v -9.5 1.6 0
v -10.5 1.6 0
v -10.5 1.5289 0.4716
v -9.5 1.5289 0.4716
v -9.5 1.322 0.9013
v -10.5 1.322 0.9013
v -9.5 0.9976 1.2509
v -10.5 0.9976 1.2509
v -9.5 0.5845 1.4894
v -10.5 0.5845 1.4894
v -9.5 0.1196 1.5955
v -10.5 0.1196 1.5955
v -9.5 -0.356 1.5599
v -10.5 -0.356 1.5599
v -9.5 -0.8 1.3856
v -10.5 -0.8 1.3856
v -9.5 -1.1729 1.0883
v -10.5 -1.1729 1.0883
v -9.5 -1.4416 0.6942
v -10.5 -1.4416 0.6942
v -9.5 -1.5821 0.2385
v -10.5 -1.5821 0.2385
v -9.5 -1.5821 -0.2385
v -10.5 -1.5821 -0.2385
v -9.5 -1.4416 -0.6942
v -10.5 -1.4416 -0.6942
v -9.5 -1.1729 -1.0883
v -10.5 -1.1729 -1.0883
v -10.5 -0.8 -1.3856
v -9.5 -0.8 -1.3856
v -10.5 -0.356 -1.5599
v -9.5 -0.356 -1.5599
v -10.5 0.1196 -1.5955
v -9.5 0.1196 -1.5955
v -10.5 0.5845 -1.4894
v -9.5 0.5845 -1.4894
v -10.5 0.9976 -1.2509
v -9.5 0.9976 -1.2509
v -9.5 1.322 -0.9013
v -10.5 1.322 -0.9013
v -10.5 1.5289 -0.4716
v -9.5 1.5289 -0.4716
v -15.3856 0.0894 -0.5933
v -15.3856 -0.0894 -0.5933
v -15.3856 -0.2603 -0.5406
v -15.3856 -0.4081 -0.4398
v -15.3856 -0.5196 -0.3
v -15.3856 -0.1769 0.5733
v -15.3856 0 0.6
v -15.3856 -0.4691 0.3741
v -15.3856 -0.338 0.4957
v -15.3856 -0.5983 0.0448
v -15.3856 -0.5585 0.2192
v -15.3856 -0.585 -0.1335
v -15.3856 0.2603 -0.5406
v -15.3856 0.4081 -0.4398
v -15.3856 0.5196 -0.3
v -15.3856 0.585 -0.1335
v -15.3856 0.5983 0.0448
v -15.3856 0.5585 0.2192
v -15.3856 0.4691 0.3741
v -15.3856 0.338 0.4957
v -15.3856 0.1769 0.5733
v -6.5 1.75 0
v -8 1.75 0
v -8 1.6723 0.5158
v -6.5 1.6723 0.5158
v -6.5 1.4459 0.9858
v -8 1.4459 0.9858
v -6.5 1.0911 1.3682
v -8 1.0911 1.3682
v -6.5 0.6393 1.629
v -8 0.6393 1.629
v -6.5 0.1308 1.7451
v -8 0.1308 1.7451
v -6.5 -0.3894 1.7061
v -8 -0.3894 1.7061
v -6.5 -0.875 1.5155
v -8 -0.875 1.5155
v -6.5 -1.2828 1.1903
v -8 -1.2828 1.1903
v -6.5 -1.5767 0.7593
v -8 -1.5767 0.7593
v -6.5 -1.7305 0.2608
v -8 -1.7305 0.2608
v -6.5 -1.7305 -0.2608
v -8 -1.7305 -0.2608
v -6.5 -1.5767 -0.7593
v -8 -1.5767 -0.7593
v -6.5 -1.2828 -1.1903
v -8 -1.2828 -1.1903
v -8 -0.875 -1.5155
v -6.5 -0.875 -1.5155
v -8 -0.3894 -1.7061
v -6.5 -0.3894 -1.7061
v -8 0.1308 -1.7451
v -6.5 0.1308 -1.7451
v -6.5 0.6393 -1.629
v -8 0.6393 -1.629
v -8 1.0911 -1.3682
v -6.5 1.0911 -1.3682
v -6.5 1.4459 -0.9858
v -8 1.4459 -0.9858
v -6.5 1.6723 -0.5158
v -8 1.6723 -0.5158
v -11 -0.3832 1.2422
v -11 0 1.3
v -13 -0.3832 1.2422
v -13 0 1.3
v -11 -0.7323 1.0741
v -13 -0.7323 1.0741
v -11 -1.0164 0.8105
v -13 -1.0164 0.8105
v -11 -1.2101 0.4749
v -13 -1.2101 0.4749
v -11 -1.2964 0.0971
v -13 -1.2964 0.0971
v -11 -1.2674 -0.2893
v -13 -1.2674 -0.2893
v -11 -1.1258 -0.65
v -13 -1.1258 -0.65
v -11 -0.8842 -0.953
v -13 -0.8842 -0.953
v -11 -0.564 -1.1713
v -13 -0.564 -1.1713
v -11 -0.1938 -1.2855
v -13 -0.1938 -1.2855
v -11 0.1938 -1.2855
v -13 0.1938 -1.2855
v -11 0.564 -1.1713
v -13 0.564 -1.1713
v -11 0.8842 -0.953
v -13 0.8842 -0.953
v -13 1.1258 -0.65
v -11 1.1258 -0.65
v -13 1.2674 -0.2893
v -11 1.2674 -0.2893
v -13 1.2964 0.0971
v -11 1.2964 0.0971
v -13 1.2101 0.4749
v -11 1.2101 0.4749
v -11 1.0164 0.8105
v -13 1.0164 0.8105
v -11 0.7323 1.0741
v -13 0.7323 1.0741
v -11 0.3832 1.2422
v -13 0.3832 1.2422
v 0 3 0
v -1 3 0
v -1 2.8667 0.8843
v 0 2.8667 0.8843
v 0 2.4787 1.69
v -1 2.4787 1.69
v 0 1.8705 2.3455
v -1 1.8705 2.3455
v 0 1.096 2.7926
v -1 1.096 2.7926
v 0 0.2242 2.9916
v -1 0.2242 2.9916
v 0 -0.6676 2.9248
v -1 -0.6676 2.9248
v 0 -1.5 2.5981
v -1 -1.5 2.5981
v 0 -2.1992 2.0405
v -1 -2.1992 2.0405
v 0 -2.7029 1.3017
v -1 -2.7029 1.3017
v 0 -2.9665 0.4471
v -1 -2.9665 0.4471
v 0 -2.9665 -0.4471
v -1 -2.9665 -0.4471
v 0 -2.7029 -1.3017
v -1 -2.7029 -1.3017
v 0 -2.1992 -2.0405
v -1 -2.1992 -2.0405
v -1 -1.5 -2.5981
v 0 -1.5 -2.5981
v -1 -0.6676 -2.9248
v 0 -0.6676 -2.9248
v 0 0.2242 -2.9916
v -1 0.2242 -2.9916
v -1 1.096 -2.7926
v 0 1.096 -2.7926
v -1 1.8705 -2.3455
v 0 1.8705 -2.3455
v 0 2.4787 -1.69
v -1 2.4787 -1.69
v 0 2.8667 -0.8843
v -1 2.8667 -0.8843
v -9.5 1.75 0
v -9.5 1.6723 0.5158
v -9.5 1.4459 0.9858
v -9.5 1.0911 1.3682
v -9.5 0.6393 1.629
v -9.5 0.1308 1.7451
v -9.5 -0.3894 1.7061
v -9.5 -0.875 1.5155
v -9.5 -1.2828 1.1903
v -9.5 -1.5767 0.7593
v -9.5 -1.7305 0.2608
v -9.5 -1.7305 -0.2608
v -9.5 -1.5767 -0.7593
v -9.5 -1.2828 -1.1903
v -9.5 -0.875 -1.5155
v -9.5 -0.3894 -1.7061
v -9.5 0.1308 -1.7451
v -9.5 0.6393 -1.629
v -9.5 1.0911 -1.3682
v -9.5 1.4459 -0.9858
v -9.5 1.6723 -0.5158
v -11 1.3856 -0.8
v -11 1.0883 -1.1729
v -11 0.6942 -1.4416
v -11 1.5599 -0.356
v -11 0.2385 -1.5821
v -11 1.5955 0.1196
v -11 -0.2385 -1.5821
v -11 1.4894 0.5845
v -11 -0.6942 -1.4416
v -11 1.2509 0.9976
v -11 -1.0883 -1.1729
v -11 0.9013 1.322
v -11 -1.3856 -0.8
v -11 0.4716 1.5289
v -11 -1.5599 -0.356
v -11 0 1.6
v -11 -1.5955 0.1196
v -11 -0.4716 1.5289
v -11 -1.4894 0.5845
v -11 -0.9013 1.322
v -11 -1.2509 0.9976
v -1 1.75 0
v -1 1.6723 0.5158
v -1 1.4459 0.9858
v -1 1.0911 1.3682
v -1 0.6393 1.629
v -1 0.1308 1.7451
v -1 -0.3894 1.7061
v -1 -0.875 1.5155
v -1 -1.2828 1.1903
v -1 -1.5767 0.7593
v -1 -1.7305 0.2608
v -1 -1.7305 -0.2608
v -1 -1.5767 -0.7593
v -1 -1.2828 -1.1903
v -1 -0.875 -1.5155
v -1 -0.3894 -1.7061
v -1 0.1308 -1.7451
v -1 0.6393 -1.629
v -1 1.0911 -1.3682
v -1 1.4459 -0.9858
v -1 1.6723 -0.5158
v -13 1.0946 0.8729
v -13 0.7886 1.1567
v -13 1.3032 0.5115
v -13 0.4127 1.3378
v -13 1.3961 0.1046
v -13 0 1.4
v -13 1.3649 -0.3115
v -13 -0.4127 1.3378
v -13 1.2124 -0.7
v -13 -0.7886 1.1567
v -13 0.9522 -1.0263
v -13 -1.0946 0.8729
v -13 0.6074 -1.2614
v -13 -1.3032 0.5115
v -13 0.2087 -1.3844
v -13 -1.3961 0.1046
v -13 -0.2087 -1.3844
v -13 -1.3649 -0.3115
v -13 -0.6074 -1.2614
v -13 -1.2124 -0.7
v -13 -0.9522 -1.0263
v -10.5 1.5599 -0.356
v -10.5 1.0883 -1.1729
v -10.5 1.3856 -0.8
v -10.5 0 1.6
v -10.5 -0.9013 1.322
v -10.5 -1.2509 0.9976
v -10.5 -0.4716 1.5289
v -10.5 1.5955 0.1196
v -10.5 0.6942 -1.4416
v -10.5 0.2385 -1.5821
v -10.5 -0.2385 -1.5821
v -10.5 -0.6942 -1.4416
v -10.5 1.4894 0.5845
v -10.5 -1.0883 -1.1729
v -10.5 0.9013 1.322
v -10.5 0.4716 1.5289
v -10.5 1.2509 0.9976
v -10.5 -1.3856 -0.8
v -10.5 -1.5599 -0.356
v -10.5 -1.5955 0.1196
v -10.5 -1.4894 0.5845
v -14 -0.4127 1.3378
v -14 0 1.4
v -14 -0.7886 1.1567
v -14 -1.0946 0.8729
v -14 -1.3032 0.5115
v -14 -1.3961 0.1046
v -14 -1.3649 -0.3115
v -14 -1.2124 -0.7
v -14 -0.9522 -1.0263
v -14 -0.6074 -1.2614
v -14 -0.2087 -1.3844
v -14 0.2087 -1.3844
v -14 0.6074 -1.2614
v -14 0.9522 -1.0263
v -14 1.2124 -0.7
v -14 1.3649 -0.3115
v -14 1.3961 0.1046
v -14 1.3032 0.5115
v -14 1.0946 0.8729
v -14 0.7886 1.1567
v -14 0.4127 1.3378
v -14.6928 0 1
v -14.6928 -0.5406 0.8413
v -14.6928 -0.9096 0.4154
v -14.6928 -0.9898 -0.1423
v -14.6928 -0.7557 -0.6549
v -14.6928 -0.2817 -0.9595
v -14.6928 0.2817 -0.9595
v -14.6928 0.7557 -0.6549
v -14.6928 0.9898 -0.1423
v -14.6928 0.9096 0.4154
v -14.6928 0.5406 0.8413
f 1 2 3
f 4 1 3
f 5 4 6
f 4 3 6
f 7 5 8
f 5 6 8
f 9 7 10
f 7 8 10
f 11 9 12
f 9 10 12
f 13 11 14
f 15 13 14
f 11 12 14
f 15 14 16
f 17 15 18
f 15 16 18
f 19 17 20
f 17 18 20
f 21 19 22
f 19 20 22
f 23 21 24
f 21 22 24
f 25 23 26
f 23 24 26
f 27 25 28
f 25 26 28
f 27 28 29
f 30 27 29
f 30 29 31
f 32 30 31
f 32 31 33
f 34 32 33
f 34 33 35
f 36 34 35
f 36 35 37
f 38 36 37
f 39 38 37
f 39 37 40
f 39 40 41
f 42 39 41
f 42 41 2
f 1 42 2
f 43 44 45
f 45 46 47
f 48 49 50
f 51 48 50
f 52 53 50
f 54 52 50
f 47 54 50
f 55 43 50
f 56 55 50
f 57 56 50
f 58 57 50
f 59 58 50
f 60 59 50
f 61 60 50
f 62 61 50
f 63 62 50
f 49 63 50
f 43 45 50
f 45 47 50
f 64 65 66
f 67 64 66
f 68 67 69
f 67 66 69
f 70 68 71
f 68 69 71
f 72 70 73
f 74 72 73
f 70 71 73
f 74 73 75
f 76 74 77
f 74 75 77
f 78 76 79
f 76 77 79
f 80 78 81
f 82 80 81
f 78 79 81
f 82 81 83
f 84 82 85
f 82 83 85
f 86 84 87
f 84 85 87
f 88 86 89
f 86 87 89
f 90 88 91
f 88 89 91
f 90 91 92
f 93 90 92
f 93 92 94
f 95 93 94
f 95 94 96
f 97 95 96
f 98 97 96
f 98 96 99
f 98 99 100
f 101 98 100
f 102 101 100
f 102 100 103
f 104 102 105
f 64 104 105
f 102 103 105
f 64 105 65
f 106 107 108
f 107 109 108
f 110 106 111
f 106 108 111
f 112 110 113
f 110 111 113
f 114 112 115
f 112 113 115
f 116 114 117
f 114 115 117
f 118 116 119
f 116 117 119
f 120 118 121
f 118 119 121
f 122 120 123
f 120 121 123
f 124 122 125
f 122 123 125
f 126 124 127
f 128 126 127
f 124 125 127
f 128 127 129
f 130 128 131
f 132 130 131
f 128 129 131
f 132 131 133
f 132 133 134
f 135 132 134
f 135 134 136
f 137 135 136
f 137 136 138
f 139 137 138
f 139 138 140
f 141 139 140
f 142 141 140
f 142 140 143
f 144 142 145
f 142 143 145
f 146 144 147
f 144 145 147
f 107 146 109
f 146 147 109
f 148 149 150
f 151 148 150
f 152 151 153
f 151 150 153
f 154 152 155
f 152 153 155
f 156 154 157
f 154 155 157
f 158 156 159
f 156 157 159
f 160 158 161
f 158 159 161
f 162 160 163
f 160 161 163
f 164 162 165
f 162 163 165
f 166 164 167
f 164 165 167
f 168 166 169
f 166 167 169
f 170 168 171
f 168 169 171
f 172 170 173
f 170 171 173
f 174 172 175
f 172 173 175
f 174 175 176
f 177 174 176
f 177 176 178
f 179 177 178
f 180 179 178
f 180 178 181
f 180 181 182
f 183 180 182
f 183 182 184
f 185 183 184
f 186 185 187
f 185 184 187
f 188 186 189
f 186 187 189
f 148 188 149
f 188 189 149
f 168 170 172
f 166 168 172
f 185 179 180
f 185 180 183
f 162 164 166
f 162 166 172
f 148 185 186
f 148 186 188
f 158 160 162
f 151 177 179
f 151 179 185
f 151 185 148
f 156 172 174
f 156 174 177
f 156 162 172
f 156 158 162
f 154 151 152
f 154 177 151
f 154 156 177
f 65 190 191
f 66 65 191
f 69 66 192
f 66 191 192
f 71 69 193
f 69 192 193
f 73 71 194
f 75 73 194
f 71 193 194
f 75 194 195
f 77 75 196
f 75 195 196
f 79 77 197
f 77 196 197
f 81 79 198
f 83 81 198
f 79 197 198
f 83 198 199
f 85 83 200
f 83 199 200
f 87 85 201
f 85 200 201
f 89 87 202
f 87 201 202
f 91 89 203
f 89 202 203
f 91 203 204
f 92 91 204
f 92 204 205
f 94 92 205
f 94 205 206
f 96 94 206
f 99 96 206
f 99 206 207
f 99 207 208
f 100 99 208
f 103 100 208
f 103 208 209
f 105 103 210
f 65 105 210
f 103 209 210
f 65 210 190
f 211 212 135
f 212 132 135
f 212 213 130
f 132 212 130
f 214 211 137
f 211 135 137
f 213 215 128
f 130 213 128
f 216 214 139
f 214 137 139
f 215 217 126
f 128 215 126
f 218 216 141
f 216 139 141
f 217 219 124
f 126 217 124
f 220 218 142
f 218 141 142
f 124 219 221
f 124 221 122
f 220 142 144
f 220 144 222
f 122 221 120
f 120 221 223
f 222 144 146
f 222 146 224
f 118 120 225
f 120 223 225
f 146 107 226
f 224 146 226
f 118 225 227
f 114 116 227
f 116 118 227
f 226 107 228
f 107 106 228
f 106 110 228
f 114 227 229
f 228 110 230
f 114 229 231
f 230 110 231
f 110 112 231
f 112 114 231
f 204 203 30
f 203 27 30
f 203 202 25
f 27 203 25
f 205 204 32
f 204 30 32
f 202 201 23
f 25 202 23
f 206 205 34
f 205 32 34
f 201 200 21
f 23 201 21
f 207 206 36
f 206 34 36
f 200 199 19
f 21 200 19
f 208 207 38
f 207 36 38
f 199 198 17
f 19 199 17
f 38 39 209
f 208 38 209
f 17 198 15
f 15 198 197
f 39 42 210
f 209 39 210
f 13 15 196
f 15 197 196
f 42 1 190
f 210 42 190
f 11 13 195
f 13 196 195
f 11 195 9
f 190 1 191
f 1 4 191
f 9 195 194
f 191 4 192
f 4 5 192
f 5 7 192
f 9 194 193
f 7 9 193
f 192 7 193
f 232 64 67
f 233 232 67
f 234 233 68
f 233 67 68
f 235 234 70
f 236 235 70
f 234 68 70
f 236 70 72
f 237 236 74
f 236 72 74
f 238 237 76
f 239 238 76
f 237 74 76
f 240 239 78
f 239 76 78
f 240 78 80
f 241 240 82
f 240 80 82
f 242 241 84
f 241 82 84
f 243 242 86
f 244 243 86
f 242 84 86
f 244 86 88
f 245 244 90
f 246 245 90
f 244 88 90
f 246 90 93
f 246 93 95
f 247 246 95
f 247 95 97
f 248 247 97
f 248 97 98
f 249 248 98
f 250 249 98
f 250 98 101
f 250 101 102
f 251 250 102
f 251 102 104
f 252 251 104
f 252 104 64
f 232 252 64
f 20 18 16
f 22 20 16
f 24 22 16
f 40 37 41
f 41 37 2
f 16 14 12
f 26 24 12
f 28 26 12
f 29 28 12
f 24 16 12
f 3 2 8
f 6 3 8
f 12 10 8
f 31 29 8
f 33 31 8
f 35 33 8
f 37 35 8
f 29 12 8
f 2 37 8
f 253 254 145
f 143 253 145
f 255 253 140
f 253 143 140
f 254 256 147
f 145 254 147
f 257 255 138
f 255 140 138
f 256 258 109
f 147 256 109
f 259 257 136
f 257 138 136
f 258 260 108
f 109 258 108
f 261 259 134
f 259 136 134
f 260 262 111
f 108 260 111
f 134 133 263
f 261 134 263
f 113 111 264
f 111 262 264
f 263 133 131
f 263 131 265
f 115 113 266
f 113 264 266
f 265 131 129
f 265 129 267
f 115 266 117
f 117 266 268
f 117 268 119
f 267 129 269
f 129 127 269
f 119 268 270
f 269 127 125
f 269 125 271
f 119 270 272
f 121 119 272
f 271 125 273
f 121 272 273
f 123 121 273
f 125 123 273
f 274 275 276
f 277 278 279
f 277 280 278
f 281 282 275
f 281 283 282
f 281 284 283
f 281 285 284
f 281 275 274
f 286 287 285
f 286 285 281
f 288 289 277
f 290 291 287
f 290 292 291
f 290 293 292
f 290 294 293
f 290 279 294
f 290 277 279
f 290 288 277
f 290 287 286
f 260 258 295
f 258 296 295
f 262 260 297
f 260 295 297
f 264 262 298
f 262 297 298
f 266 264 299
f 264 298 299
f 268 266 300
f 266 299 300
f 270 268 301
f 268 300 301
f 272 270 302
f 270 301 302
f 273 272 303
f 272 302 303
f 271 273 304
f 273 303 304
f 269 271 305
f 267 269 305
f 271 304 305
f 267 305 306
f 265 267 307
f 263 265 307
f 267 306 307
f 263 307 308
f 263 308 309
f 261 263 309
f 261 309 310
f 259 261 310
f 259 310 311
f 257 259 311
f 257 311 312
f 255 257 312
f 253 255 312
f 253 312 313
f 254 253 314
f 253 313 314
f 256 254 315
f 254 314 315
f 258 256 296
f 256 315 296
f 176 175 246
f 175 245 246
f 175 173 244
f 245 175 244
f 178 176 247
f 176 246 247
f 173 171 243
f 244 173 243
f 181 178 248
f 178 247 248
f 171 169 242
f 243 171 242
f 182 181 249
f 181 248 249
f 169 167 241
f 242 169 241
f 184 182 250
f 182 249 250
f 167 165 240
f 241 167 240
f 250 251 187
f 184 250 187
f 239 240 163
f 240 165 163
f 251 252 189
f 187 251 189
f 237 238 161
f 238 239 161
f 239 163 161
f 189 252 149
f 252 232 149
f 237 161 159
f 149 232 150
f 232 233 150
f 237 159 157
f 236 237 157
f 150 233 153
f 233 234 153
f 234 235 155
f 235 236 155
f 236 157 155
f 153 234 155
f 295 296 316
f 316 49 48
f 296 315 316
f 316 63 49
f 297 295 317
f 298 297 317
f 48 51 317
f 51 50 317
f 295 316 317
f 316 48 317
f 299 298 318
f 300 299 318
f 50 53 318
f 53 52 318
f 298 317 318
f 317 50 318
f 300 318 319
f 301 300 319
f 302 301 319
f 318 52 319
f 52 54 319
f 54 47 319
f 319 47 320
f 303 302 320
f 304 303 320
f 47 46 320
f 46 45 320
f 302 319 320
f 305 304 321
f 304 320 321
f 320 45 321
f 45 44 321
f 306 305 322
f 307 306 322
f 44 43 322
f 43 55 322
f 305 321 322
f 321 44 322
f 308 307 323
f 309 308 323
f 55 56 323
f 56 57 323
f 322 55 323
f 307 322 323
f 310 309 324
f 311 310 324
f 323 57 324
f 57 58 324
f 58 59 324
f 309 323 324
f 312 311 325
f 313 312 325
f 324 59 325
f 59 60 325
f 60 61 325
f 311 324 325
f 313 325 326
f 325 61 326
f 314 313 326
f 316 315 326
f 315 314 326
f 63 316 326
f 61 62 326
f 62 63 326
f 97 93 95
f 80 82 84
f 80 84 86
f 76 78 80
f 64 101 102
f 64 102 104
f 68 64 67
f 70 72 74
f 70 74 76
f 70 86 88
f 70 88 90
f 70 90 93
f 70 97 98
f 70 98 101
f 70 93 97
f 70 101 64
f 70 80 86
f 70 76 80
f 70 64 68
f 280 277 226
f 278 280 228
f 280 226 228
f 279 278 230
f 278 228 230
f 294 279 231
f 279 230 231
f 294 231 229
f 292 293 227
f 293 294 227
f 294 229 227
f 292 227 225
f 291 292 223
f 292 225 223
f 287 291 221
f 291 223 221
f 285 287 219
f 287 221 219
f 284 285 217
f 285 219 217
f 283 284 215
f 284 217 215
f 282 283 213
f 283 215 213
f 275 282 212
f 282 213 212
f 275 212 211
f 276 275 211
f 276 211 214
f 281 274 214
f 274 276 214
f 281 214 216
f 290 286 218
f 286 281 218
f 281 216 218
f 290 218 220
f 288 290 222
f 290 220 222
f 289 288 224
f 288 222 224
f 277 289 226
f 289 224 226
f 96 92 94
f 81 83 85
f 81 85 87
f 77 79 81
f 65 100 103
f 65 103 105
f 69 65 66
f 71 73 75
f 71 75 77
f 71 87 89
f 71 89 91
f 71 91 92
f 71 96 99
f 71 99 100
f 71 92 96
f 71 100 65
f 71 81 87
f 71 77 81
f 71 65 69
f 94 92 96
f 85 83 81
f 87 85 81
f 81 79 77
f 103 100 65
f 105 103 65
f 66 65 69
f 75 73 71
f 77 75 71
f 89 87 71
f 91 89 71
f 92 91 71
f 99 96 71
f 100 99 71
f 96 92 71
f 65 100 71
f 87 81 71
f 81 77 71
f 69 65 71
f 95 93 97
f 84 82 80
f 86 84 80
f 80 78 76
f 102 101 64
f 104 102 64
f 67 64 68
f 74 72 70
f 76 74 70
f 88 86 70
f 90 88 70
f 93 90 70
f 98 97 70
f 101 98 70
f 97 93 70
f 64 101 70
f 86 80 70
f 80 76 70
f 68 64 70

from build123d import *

# Parameters (mm, degrees)
FRACTIONNER1_START         = -10.5
FRACTIONNER1_OUTLINE_R     = 3
FRACTIONNER1_DEPTH         = 10.5
FRACTIONNER1_START_2       = -6.5
FRACTIONNER1_2_OUTLINE_R   = 1.75
FRACTIONNER1_2_DEPTH       = 6.5
FRACTIONNER1_START_3       = -1
FRACTIONNER1_3_OUTLINE_R   = 3
FRACTIONNER1_3_OUTLINE_R_2 = 1.75
FRACTIONNER1_3_DEPTH       = 1
FRACTIONNER1_START_4       = -8
FRACTIONNER1_4_OUTLINE_R   = 1.75
FRACTIONNER1_4_DEPTH       = 1.5
FRACTIONNER1_5_OUTLINE_R   = 1.6
FRACTIONNER1_5_DEPTH       = 2.5
FRACTIONNER1_START_5       = -9.5
FRACTIONNER1_6_OUTLINE_R   = 1.75
FRACTIONNER1_6_OUTLINE_R_2 = 1.6
FRACTIONNER1_6_DEPTH       = 1.5


# Read off the part's stored shape, not the designer's step: Fractionner1
with BuildPart() as part:
    # Esquisse1 → Révolution1 (revolve)
    with BuildSketch(Plane.XY, mode=Mode.PRIVATE) as r_volution1_sk:
        Polygon((-14, 1.4), (-15.385640646, 0.6), (-15.385640646, 0), (0, 0), (0, 3), (-1, 3), (-1, 1.75), (-9.5, 1.75), (-9.5, 1.6), (-11, 1.6), (-11, 1.3), (-13, 1.3), (-13, 1.4), align=None)
    revolve(r_volution1_sk.sketch.rotate(Axis((-28.897633393, 0, 0), (1, 0, 0)), 90), axis=Axis((-28.897633393, 0, 0), (1, 0, 0)))

    # Fractionner1 outline → Fractionner1 (cut)
    with BuildSketch(Plane.YZ.offset(FRACTIONNER1_START)):
        Circle(FRACTIONNER1_OUTLINE_R)
    extrude(amount=FRACTIONNER1_DEPTH, mode=Mode.SUBTRACT)


with BuildPart() as body_2:
    # Fractionner1 2 outline → Fractionner1 2 (new body)
    with BuildSketch(Plane.YZ.offset(FRACTIONNER1_START_2)):
        Circle(FRACTIONNER1_2_OUTLINE_R)
    extrude(amount=FRACTIONNER1_2_DEPTH)

    # Fractionner1 3 outline → Fractionner1 3 (add)
    with BuildSketch(Plane.YZ.offset(FRACTIONNER1_START_3)):
        Circle(FRACTIONNER1_3_OUTLINE_R)
        Circle(FRACTIONNER1_3_OUTLINE_R_2, mode=Mode.SUBTRACT)
    extrude(amount=FRACTIONNER1_3_DEPTH)


with BuildPart() as body_3:
    # Fractionner1 4 outline → Fractionner1 4 (new body)
    with BuildSketch(Plane.YZ.offset(FRACTIONNER1_START_4)):
        Circle(FRACTIONNER1_4_OUTLINE_R)
    extrude(amount=FRACTIONNER1_4_DEPTH)


with BuildPart() as body_4:
    # Fractionner1 5 outline → Fractionner1 5 (new body)
    with BuildSketch(Plane.YZ.offset(FRACTIONNER1_START)):
        Circle(FRACTIONNER1_5_OUTLINE_R)
    extrude(amount=FRACTIONNER1_5_DEPTH)

    # Fractionner1 6 outline → Fractionner1 6 (add)
    with BuildSketch(Plane.YZ.offset(FRACTIONNER1_START_5)):
        Circle(FRACTIONNER1_6_OUTLINE_R)
        Circle(FRACTIONNER1_6_OUTLINE_R_2, mode=Mode.SUBTRACT)
    extrude(amount=FRACTIONNER1_6_DEPTH)


solid = Compound([part.part, body_2.part, body_3.part, body_4.part])
